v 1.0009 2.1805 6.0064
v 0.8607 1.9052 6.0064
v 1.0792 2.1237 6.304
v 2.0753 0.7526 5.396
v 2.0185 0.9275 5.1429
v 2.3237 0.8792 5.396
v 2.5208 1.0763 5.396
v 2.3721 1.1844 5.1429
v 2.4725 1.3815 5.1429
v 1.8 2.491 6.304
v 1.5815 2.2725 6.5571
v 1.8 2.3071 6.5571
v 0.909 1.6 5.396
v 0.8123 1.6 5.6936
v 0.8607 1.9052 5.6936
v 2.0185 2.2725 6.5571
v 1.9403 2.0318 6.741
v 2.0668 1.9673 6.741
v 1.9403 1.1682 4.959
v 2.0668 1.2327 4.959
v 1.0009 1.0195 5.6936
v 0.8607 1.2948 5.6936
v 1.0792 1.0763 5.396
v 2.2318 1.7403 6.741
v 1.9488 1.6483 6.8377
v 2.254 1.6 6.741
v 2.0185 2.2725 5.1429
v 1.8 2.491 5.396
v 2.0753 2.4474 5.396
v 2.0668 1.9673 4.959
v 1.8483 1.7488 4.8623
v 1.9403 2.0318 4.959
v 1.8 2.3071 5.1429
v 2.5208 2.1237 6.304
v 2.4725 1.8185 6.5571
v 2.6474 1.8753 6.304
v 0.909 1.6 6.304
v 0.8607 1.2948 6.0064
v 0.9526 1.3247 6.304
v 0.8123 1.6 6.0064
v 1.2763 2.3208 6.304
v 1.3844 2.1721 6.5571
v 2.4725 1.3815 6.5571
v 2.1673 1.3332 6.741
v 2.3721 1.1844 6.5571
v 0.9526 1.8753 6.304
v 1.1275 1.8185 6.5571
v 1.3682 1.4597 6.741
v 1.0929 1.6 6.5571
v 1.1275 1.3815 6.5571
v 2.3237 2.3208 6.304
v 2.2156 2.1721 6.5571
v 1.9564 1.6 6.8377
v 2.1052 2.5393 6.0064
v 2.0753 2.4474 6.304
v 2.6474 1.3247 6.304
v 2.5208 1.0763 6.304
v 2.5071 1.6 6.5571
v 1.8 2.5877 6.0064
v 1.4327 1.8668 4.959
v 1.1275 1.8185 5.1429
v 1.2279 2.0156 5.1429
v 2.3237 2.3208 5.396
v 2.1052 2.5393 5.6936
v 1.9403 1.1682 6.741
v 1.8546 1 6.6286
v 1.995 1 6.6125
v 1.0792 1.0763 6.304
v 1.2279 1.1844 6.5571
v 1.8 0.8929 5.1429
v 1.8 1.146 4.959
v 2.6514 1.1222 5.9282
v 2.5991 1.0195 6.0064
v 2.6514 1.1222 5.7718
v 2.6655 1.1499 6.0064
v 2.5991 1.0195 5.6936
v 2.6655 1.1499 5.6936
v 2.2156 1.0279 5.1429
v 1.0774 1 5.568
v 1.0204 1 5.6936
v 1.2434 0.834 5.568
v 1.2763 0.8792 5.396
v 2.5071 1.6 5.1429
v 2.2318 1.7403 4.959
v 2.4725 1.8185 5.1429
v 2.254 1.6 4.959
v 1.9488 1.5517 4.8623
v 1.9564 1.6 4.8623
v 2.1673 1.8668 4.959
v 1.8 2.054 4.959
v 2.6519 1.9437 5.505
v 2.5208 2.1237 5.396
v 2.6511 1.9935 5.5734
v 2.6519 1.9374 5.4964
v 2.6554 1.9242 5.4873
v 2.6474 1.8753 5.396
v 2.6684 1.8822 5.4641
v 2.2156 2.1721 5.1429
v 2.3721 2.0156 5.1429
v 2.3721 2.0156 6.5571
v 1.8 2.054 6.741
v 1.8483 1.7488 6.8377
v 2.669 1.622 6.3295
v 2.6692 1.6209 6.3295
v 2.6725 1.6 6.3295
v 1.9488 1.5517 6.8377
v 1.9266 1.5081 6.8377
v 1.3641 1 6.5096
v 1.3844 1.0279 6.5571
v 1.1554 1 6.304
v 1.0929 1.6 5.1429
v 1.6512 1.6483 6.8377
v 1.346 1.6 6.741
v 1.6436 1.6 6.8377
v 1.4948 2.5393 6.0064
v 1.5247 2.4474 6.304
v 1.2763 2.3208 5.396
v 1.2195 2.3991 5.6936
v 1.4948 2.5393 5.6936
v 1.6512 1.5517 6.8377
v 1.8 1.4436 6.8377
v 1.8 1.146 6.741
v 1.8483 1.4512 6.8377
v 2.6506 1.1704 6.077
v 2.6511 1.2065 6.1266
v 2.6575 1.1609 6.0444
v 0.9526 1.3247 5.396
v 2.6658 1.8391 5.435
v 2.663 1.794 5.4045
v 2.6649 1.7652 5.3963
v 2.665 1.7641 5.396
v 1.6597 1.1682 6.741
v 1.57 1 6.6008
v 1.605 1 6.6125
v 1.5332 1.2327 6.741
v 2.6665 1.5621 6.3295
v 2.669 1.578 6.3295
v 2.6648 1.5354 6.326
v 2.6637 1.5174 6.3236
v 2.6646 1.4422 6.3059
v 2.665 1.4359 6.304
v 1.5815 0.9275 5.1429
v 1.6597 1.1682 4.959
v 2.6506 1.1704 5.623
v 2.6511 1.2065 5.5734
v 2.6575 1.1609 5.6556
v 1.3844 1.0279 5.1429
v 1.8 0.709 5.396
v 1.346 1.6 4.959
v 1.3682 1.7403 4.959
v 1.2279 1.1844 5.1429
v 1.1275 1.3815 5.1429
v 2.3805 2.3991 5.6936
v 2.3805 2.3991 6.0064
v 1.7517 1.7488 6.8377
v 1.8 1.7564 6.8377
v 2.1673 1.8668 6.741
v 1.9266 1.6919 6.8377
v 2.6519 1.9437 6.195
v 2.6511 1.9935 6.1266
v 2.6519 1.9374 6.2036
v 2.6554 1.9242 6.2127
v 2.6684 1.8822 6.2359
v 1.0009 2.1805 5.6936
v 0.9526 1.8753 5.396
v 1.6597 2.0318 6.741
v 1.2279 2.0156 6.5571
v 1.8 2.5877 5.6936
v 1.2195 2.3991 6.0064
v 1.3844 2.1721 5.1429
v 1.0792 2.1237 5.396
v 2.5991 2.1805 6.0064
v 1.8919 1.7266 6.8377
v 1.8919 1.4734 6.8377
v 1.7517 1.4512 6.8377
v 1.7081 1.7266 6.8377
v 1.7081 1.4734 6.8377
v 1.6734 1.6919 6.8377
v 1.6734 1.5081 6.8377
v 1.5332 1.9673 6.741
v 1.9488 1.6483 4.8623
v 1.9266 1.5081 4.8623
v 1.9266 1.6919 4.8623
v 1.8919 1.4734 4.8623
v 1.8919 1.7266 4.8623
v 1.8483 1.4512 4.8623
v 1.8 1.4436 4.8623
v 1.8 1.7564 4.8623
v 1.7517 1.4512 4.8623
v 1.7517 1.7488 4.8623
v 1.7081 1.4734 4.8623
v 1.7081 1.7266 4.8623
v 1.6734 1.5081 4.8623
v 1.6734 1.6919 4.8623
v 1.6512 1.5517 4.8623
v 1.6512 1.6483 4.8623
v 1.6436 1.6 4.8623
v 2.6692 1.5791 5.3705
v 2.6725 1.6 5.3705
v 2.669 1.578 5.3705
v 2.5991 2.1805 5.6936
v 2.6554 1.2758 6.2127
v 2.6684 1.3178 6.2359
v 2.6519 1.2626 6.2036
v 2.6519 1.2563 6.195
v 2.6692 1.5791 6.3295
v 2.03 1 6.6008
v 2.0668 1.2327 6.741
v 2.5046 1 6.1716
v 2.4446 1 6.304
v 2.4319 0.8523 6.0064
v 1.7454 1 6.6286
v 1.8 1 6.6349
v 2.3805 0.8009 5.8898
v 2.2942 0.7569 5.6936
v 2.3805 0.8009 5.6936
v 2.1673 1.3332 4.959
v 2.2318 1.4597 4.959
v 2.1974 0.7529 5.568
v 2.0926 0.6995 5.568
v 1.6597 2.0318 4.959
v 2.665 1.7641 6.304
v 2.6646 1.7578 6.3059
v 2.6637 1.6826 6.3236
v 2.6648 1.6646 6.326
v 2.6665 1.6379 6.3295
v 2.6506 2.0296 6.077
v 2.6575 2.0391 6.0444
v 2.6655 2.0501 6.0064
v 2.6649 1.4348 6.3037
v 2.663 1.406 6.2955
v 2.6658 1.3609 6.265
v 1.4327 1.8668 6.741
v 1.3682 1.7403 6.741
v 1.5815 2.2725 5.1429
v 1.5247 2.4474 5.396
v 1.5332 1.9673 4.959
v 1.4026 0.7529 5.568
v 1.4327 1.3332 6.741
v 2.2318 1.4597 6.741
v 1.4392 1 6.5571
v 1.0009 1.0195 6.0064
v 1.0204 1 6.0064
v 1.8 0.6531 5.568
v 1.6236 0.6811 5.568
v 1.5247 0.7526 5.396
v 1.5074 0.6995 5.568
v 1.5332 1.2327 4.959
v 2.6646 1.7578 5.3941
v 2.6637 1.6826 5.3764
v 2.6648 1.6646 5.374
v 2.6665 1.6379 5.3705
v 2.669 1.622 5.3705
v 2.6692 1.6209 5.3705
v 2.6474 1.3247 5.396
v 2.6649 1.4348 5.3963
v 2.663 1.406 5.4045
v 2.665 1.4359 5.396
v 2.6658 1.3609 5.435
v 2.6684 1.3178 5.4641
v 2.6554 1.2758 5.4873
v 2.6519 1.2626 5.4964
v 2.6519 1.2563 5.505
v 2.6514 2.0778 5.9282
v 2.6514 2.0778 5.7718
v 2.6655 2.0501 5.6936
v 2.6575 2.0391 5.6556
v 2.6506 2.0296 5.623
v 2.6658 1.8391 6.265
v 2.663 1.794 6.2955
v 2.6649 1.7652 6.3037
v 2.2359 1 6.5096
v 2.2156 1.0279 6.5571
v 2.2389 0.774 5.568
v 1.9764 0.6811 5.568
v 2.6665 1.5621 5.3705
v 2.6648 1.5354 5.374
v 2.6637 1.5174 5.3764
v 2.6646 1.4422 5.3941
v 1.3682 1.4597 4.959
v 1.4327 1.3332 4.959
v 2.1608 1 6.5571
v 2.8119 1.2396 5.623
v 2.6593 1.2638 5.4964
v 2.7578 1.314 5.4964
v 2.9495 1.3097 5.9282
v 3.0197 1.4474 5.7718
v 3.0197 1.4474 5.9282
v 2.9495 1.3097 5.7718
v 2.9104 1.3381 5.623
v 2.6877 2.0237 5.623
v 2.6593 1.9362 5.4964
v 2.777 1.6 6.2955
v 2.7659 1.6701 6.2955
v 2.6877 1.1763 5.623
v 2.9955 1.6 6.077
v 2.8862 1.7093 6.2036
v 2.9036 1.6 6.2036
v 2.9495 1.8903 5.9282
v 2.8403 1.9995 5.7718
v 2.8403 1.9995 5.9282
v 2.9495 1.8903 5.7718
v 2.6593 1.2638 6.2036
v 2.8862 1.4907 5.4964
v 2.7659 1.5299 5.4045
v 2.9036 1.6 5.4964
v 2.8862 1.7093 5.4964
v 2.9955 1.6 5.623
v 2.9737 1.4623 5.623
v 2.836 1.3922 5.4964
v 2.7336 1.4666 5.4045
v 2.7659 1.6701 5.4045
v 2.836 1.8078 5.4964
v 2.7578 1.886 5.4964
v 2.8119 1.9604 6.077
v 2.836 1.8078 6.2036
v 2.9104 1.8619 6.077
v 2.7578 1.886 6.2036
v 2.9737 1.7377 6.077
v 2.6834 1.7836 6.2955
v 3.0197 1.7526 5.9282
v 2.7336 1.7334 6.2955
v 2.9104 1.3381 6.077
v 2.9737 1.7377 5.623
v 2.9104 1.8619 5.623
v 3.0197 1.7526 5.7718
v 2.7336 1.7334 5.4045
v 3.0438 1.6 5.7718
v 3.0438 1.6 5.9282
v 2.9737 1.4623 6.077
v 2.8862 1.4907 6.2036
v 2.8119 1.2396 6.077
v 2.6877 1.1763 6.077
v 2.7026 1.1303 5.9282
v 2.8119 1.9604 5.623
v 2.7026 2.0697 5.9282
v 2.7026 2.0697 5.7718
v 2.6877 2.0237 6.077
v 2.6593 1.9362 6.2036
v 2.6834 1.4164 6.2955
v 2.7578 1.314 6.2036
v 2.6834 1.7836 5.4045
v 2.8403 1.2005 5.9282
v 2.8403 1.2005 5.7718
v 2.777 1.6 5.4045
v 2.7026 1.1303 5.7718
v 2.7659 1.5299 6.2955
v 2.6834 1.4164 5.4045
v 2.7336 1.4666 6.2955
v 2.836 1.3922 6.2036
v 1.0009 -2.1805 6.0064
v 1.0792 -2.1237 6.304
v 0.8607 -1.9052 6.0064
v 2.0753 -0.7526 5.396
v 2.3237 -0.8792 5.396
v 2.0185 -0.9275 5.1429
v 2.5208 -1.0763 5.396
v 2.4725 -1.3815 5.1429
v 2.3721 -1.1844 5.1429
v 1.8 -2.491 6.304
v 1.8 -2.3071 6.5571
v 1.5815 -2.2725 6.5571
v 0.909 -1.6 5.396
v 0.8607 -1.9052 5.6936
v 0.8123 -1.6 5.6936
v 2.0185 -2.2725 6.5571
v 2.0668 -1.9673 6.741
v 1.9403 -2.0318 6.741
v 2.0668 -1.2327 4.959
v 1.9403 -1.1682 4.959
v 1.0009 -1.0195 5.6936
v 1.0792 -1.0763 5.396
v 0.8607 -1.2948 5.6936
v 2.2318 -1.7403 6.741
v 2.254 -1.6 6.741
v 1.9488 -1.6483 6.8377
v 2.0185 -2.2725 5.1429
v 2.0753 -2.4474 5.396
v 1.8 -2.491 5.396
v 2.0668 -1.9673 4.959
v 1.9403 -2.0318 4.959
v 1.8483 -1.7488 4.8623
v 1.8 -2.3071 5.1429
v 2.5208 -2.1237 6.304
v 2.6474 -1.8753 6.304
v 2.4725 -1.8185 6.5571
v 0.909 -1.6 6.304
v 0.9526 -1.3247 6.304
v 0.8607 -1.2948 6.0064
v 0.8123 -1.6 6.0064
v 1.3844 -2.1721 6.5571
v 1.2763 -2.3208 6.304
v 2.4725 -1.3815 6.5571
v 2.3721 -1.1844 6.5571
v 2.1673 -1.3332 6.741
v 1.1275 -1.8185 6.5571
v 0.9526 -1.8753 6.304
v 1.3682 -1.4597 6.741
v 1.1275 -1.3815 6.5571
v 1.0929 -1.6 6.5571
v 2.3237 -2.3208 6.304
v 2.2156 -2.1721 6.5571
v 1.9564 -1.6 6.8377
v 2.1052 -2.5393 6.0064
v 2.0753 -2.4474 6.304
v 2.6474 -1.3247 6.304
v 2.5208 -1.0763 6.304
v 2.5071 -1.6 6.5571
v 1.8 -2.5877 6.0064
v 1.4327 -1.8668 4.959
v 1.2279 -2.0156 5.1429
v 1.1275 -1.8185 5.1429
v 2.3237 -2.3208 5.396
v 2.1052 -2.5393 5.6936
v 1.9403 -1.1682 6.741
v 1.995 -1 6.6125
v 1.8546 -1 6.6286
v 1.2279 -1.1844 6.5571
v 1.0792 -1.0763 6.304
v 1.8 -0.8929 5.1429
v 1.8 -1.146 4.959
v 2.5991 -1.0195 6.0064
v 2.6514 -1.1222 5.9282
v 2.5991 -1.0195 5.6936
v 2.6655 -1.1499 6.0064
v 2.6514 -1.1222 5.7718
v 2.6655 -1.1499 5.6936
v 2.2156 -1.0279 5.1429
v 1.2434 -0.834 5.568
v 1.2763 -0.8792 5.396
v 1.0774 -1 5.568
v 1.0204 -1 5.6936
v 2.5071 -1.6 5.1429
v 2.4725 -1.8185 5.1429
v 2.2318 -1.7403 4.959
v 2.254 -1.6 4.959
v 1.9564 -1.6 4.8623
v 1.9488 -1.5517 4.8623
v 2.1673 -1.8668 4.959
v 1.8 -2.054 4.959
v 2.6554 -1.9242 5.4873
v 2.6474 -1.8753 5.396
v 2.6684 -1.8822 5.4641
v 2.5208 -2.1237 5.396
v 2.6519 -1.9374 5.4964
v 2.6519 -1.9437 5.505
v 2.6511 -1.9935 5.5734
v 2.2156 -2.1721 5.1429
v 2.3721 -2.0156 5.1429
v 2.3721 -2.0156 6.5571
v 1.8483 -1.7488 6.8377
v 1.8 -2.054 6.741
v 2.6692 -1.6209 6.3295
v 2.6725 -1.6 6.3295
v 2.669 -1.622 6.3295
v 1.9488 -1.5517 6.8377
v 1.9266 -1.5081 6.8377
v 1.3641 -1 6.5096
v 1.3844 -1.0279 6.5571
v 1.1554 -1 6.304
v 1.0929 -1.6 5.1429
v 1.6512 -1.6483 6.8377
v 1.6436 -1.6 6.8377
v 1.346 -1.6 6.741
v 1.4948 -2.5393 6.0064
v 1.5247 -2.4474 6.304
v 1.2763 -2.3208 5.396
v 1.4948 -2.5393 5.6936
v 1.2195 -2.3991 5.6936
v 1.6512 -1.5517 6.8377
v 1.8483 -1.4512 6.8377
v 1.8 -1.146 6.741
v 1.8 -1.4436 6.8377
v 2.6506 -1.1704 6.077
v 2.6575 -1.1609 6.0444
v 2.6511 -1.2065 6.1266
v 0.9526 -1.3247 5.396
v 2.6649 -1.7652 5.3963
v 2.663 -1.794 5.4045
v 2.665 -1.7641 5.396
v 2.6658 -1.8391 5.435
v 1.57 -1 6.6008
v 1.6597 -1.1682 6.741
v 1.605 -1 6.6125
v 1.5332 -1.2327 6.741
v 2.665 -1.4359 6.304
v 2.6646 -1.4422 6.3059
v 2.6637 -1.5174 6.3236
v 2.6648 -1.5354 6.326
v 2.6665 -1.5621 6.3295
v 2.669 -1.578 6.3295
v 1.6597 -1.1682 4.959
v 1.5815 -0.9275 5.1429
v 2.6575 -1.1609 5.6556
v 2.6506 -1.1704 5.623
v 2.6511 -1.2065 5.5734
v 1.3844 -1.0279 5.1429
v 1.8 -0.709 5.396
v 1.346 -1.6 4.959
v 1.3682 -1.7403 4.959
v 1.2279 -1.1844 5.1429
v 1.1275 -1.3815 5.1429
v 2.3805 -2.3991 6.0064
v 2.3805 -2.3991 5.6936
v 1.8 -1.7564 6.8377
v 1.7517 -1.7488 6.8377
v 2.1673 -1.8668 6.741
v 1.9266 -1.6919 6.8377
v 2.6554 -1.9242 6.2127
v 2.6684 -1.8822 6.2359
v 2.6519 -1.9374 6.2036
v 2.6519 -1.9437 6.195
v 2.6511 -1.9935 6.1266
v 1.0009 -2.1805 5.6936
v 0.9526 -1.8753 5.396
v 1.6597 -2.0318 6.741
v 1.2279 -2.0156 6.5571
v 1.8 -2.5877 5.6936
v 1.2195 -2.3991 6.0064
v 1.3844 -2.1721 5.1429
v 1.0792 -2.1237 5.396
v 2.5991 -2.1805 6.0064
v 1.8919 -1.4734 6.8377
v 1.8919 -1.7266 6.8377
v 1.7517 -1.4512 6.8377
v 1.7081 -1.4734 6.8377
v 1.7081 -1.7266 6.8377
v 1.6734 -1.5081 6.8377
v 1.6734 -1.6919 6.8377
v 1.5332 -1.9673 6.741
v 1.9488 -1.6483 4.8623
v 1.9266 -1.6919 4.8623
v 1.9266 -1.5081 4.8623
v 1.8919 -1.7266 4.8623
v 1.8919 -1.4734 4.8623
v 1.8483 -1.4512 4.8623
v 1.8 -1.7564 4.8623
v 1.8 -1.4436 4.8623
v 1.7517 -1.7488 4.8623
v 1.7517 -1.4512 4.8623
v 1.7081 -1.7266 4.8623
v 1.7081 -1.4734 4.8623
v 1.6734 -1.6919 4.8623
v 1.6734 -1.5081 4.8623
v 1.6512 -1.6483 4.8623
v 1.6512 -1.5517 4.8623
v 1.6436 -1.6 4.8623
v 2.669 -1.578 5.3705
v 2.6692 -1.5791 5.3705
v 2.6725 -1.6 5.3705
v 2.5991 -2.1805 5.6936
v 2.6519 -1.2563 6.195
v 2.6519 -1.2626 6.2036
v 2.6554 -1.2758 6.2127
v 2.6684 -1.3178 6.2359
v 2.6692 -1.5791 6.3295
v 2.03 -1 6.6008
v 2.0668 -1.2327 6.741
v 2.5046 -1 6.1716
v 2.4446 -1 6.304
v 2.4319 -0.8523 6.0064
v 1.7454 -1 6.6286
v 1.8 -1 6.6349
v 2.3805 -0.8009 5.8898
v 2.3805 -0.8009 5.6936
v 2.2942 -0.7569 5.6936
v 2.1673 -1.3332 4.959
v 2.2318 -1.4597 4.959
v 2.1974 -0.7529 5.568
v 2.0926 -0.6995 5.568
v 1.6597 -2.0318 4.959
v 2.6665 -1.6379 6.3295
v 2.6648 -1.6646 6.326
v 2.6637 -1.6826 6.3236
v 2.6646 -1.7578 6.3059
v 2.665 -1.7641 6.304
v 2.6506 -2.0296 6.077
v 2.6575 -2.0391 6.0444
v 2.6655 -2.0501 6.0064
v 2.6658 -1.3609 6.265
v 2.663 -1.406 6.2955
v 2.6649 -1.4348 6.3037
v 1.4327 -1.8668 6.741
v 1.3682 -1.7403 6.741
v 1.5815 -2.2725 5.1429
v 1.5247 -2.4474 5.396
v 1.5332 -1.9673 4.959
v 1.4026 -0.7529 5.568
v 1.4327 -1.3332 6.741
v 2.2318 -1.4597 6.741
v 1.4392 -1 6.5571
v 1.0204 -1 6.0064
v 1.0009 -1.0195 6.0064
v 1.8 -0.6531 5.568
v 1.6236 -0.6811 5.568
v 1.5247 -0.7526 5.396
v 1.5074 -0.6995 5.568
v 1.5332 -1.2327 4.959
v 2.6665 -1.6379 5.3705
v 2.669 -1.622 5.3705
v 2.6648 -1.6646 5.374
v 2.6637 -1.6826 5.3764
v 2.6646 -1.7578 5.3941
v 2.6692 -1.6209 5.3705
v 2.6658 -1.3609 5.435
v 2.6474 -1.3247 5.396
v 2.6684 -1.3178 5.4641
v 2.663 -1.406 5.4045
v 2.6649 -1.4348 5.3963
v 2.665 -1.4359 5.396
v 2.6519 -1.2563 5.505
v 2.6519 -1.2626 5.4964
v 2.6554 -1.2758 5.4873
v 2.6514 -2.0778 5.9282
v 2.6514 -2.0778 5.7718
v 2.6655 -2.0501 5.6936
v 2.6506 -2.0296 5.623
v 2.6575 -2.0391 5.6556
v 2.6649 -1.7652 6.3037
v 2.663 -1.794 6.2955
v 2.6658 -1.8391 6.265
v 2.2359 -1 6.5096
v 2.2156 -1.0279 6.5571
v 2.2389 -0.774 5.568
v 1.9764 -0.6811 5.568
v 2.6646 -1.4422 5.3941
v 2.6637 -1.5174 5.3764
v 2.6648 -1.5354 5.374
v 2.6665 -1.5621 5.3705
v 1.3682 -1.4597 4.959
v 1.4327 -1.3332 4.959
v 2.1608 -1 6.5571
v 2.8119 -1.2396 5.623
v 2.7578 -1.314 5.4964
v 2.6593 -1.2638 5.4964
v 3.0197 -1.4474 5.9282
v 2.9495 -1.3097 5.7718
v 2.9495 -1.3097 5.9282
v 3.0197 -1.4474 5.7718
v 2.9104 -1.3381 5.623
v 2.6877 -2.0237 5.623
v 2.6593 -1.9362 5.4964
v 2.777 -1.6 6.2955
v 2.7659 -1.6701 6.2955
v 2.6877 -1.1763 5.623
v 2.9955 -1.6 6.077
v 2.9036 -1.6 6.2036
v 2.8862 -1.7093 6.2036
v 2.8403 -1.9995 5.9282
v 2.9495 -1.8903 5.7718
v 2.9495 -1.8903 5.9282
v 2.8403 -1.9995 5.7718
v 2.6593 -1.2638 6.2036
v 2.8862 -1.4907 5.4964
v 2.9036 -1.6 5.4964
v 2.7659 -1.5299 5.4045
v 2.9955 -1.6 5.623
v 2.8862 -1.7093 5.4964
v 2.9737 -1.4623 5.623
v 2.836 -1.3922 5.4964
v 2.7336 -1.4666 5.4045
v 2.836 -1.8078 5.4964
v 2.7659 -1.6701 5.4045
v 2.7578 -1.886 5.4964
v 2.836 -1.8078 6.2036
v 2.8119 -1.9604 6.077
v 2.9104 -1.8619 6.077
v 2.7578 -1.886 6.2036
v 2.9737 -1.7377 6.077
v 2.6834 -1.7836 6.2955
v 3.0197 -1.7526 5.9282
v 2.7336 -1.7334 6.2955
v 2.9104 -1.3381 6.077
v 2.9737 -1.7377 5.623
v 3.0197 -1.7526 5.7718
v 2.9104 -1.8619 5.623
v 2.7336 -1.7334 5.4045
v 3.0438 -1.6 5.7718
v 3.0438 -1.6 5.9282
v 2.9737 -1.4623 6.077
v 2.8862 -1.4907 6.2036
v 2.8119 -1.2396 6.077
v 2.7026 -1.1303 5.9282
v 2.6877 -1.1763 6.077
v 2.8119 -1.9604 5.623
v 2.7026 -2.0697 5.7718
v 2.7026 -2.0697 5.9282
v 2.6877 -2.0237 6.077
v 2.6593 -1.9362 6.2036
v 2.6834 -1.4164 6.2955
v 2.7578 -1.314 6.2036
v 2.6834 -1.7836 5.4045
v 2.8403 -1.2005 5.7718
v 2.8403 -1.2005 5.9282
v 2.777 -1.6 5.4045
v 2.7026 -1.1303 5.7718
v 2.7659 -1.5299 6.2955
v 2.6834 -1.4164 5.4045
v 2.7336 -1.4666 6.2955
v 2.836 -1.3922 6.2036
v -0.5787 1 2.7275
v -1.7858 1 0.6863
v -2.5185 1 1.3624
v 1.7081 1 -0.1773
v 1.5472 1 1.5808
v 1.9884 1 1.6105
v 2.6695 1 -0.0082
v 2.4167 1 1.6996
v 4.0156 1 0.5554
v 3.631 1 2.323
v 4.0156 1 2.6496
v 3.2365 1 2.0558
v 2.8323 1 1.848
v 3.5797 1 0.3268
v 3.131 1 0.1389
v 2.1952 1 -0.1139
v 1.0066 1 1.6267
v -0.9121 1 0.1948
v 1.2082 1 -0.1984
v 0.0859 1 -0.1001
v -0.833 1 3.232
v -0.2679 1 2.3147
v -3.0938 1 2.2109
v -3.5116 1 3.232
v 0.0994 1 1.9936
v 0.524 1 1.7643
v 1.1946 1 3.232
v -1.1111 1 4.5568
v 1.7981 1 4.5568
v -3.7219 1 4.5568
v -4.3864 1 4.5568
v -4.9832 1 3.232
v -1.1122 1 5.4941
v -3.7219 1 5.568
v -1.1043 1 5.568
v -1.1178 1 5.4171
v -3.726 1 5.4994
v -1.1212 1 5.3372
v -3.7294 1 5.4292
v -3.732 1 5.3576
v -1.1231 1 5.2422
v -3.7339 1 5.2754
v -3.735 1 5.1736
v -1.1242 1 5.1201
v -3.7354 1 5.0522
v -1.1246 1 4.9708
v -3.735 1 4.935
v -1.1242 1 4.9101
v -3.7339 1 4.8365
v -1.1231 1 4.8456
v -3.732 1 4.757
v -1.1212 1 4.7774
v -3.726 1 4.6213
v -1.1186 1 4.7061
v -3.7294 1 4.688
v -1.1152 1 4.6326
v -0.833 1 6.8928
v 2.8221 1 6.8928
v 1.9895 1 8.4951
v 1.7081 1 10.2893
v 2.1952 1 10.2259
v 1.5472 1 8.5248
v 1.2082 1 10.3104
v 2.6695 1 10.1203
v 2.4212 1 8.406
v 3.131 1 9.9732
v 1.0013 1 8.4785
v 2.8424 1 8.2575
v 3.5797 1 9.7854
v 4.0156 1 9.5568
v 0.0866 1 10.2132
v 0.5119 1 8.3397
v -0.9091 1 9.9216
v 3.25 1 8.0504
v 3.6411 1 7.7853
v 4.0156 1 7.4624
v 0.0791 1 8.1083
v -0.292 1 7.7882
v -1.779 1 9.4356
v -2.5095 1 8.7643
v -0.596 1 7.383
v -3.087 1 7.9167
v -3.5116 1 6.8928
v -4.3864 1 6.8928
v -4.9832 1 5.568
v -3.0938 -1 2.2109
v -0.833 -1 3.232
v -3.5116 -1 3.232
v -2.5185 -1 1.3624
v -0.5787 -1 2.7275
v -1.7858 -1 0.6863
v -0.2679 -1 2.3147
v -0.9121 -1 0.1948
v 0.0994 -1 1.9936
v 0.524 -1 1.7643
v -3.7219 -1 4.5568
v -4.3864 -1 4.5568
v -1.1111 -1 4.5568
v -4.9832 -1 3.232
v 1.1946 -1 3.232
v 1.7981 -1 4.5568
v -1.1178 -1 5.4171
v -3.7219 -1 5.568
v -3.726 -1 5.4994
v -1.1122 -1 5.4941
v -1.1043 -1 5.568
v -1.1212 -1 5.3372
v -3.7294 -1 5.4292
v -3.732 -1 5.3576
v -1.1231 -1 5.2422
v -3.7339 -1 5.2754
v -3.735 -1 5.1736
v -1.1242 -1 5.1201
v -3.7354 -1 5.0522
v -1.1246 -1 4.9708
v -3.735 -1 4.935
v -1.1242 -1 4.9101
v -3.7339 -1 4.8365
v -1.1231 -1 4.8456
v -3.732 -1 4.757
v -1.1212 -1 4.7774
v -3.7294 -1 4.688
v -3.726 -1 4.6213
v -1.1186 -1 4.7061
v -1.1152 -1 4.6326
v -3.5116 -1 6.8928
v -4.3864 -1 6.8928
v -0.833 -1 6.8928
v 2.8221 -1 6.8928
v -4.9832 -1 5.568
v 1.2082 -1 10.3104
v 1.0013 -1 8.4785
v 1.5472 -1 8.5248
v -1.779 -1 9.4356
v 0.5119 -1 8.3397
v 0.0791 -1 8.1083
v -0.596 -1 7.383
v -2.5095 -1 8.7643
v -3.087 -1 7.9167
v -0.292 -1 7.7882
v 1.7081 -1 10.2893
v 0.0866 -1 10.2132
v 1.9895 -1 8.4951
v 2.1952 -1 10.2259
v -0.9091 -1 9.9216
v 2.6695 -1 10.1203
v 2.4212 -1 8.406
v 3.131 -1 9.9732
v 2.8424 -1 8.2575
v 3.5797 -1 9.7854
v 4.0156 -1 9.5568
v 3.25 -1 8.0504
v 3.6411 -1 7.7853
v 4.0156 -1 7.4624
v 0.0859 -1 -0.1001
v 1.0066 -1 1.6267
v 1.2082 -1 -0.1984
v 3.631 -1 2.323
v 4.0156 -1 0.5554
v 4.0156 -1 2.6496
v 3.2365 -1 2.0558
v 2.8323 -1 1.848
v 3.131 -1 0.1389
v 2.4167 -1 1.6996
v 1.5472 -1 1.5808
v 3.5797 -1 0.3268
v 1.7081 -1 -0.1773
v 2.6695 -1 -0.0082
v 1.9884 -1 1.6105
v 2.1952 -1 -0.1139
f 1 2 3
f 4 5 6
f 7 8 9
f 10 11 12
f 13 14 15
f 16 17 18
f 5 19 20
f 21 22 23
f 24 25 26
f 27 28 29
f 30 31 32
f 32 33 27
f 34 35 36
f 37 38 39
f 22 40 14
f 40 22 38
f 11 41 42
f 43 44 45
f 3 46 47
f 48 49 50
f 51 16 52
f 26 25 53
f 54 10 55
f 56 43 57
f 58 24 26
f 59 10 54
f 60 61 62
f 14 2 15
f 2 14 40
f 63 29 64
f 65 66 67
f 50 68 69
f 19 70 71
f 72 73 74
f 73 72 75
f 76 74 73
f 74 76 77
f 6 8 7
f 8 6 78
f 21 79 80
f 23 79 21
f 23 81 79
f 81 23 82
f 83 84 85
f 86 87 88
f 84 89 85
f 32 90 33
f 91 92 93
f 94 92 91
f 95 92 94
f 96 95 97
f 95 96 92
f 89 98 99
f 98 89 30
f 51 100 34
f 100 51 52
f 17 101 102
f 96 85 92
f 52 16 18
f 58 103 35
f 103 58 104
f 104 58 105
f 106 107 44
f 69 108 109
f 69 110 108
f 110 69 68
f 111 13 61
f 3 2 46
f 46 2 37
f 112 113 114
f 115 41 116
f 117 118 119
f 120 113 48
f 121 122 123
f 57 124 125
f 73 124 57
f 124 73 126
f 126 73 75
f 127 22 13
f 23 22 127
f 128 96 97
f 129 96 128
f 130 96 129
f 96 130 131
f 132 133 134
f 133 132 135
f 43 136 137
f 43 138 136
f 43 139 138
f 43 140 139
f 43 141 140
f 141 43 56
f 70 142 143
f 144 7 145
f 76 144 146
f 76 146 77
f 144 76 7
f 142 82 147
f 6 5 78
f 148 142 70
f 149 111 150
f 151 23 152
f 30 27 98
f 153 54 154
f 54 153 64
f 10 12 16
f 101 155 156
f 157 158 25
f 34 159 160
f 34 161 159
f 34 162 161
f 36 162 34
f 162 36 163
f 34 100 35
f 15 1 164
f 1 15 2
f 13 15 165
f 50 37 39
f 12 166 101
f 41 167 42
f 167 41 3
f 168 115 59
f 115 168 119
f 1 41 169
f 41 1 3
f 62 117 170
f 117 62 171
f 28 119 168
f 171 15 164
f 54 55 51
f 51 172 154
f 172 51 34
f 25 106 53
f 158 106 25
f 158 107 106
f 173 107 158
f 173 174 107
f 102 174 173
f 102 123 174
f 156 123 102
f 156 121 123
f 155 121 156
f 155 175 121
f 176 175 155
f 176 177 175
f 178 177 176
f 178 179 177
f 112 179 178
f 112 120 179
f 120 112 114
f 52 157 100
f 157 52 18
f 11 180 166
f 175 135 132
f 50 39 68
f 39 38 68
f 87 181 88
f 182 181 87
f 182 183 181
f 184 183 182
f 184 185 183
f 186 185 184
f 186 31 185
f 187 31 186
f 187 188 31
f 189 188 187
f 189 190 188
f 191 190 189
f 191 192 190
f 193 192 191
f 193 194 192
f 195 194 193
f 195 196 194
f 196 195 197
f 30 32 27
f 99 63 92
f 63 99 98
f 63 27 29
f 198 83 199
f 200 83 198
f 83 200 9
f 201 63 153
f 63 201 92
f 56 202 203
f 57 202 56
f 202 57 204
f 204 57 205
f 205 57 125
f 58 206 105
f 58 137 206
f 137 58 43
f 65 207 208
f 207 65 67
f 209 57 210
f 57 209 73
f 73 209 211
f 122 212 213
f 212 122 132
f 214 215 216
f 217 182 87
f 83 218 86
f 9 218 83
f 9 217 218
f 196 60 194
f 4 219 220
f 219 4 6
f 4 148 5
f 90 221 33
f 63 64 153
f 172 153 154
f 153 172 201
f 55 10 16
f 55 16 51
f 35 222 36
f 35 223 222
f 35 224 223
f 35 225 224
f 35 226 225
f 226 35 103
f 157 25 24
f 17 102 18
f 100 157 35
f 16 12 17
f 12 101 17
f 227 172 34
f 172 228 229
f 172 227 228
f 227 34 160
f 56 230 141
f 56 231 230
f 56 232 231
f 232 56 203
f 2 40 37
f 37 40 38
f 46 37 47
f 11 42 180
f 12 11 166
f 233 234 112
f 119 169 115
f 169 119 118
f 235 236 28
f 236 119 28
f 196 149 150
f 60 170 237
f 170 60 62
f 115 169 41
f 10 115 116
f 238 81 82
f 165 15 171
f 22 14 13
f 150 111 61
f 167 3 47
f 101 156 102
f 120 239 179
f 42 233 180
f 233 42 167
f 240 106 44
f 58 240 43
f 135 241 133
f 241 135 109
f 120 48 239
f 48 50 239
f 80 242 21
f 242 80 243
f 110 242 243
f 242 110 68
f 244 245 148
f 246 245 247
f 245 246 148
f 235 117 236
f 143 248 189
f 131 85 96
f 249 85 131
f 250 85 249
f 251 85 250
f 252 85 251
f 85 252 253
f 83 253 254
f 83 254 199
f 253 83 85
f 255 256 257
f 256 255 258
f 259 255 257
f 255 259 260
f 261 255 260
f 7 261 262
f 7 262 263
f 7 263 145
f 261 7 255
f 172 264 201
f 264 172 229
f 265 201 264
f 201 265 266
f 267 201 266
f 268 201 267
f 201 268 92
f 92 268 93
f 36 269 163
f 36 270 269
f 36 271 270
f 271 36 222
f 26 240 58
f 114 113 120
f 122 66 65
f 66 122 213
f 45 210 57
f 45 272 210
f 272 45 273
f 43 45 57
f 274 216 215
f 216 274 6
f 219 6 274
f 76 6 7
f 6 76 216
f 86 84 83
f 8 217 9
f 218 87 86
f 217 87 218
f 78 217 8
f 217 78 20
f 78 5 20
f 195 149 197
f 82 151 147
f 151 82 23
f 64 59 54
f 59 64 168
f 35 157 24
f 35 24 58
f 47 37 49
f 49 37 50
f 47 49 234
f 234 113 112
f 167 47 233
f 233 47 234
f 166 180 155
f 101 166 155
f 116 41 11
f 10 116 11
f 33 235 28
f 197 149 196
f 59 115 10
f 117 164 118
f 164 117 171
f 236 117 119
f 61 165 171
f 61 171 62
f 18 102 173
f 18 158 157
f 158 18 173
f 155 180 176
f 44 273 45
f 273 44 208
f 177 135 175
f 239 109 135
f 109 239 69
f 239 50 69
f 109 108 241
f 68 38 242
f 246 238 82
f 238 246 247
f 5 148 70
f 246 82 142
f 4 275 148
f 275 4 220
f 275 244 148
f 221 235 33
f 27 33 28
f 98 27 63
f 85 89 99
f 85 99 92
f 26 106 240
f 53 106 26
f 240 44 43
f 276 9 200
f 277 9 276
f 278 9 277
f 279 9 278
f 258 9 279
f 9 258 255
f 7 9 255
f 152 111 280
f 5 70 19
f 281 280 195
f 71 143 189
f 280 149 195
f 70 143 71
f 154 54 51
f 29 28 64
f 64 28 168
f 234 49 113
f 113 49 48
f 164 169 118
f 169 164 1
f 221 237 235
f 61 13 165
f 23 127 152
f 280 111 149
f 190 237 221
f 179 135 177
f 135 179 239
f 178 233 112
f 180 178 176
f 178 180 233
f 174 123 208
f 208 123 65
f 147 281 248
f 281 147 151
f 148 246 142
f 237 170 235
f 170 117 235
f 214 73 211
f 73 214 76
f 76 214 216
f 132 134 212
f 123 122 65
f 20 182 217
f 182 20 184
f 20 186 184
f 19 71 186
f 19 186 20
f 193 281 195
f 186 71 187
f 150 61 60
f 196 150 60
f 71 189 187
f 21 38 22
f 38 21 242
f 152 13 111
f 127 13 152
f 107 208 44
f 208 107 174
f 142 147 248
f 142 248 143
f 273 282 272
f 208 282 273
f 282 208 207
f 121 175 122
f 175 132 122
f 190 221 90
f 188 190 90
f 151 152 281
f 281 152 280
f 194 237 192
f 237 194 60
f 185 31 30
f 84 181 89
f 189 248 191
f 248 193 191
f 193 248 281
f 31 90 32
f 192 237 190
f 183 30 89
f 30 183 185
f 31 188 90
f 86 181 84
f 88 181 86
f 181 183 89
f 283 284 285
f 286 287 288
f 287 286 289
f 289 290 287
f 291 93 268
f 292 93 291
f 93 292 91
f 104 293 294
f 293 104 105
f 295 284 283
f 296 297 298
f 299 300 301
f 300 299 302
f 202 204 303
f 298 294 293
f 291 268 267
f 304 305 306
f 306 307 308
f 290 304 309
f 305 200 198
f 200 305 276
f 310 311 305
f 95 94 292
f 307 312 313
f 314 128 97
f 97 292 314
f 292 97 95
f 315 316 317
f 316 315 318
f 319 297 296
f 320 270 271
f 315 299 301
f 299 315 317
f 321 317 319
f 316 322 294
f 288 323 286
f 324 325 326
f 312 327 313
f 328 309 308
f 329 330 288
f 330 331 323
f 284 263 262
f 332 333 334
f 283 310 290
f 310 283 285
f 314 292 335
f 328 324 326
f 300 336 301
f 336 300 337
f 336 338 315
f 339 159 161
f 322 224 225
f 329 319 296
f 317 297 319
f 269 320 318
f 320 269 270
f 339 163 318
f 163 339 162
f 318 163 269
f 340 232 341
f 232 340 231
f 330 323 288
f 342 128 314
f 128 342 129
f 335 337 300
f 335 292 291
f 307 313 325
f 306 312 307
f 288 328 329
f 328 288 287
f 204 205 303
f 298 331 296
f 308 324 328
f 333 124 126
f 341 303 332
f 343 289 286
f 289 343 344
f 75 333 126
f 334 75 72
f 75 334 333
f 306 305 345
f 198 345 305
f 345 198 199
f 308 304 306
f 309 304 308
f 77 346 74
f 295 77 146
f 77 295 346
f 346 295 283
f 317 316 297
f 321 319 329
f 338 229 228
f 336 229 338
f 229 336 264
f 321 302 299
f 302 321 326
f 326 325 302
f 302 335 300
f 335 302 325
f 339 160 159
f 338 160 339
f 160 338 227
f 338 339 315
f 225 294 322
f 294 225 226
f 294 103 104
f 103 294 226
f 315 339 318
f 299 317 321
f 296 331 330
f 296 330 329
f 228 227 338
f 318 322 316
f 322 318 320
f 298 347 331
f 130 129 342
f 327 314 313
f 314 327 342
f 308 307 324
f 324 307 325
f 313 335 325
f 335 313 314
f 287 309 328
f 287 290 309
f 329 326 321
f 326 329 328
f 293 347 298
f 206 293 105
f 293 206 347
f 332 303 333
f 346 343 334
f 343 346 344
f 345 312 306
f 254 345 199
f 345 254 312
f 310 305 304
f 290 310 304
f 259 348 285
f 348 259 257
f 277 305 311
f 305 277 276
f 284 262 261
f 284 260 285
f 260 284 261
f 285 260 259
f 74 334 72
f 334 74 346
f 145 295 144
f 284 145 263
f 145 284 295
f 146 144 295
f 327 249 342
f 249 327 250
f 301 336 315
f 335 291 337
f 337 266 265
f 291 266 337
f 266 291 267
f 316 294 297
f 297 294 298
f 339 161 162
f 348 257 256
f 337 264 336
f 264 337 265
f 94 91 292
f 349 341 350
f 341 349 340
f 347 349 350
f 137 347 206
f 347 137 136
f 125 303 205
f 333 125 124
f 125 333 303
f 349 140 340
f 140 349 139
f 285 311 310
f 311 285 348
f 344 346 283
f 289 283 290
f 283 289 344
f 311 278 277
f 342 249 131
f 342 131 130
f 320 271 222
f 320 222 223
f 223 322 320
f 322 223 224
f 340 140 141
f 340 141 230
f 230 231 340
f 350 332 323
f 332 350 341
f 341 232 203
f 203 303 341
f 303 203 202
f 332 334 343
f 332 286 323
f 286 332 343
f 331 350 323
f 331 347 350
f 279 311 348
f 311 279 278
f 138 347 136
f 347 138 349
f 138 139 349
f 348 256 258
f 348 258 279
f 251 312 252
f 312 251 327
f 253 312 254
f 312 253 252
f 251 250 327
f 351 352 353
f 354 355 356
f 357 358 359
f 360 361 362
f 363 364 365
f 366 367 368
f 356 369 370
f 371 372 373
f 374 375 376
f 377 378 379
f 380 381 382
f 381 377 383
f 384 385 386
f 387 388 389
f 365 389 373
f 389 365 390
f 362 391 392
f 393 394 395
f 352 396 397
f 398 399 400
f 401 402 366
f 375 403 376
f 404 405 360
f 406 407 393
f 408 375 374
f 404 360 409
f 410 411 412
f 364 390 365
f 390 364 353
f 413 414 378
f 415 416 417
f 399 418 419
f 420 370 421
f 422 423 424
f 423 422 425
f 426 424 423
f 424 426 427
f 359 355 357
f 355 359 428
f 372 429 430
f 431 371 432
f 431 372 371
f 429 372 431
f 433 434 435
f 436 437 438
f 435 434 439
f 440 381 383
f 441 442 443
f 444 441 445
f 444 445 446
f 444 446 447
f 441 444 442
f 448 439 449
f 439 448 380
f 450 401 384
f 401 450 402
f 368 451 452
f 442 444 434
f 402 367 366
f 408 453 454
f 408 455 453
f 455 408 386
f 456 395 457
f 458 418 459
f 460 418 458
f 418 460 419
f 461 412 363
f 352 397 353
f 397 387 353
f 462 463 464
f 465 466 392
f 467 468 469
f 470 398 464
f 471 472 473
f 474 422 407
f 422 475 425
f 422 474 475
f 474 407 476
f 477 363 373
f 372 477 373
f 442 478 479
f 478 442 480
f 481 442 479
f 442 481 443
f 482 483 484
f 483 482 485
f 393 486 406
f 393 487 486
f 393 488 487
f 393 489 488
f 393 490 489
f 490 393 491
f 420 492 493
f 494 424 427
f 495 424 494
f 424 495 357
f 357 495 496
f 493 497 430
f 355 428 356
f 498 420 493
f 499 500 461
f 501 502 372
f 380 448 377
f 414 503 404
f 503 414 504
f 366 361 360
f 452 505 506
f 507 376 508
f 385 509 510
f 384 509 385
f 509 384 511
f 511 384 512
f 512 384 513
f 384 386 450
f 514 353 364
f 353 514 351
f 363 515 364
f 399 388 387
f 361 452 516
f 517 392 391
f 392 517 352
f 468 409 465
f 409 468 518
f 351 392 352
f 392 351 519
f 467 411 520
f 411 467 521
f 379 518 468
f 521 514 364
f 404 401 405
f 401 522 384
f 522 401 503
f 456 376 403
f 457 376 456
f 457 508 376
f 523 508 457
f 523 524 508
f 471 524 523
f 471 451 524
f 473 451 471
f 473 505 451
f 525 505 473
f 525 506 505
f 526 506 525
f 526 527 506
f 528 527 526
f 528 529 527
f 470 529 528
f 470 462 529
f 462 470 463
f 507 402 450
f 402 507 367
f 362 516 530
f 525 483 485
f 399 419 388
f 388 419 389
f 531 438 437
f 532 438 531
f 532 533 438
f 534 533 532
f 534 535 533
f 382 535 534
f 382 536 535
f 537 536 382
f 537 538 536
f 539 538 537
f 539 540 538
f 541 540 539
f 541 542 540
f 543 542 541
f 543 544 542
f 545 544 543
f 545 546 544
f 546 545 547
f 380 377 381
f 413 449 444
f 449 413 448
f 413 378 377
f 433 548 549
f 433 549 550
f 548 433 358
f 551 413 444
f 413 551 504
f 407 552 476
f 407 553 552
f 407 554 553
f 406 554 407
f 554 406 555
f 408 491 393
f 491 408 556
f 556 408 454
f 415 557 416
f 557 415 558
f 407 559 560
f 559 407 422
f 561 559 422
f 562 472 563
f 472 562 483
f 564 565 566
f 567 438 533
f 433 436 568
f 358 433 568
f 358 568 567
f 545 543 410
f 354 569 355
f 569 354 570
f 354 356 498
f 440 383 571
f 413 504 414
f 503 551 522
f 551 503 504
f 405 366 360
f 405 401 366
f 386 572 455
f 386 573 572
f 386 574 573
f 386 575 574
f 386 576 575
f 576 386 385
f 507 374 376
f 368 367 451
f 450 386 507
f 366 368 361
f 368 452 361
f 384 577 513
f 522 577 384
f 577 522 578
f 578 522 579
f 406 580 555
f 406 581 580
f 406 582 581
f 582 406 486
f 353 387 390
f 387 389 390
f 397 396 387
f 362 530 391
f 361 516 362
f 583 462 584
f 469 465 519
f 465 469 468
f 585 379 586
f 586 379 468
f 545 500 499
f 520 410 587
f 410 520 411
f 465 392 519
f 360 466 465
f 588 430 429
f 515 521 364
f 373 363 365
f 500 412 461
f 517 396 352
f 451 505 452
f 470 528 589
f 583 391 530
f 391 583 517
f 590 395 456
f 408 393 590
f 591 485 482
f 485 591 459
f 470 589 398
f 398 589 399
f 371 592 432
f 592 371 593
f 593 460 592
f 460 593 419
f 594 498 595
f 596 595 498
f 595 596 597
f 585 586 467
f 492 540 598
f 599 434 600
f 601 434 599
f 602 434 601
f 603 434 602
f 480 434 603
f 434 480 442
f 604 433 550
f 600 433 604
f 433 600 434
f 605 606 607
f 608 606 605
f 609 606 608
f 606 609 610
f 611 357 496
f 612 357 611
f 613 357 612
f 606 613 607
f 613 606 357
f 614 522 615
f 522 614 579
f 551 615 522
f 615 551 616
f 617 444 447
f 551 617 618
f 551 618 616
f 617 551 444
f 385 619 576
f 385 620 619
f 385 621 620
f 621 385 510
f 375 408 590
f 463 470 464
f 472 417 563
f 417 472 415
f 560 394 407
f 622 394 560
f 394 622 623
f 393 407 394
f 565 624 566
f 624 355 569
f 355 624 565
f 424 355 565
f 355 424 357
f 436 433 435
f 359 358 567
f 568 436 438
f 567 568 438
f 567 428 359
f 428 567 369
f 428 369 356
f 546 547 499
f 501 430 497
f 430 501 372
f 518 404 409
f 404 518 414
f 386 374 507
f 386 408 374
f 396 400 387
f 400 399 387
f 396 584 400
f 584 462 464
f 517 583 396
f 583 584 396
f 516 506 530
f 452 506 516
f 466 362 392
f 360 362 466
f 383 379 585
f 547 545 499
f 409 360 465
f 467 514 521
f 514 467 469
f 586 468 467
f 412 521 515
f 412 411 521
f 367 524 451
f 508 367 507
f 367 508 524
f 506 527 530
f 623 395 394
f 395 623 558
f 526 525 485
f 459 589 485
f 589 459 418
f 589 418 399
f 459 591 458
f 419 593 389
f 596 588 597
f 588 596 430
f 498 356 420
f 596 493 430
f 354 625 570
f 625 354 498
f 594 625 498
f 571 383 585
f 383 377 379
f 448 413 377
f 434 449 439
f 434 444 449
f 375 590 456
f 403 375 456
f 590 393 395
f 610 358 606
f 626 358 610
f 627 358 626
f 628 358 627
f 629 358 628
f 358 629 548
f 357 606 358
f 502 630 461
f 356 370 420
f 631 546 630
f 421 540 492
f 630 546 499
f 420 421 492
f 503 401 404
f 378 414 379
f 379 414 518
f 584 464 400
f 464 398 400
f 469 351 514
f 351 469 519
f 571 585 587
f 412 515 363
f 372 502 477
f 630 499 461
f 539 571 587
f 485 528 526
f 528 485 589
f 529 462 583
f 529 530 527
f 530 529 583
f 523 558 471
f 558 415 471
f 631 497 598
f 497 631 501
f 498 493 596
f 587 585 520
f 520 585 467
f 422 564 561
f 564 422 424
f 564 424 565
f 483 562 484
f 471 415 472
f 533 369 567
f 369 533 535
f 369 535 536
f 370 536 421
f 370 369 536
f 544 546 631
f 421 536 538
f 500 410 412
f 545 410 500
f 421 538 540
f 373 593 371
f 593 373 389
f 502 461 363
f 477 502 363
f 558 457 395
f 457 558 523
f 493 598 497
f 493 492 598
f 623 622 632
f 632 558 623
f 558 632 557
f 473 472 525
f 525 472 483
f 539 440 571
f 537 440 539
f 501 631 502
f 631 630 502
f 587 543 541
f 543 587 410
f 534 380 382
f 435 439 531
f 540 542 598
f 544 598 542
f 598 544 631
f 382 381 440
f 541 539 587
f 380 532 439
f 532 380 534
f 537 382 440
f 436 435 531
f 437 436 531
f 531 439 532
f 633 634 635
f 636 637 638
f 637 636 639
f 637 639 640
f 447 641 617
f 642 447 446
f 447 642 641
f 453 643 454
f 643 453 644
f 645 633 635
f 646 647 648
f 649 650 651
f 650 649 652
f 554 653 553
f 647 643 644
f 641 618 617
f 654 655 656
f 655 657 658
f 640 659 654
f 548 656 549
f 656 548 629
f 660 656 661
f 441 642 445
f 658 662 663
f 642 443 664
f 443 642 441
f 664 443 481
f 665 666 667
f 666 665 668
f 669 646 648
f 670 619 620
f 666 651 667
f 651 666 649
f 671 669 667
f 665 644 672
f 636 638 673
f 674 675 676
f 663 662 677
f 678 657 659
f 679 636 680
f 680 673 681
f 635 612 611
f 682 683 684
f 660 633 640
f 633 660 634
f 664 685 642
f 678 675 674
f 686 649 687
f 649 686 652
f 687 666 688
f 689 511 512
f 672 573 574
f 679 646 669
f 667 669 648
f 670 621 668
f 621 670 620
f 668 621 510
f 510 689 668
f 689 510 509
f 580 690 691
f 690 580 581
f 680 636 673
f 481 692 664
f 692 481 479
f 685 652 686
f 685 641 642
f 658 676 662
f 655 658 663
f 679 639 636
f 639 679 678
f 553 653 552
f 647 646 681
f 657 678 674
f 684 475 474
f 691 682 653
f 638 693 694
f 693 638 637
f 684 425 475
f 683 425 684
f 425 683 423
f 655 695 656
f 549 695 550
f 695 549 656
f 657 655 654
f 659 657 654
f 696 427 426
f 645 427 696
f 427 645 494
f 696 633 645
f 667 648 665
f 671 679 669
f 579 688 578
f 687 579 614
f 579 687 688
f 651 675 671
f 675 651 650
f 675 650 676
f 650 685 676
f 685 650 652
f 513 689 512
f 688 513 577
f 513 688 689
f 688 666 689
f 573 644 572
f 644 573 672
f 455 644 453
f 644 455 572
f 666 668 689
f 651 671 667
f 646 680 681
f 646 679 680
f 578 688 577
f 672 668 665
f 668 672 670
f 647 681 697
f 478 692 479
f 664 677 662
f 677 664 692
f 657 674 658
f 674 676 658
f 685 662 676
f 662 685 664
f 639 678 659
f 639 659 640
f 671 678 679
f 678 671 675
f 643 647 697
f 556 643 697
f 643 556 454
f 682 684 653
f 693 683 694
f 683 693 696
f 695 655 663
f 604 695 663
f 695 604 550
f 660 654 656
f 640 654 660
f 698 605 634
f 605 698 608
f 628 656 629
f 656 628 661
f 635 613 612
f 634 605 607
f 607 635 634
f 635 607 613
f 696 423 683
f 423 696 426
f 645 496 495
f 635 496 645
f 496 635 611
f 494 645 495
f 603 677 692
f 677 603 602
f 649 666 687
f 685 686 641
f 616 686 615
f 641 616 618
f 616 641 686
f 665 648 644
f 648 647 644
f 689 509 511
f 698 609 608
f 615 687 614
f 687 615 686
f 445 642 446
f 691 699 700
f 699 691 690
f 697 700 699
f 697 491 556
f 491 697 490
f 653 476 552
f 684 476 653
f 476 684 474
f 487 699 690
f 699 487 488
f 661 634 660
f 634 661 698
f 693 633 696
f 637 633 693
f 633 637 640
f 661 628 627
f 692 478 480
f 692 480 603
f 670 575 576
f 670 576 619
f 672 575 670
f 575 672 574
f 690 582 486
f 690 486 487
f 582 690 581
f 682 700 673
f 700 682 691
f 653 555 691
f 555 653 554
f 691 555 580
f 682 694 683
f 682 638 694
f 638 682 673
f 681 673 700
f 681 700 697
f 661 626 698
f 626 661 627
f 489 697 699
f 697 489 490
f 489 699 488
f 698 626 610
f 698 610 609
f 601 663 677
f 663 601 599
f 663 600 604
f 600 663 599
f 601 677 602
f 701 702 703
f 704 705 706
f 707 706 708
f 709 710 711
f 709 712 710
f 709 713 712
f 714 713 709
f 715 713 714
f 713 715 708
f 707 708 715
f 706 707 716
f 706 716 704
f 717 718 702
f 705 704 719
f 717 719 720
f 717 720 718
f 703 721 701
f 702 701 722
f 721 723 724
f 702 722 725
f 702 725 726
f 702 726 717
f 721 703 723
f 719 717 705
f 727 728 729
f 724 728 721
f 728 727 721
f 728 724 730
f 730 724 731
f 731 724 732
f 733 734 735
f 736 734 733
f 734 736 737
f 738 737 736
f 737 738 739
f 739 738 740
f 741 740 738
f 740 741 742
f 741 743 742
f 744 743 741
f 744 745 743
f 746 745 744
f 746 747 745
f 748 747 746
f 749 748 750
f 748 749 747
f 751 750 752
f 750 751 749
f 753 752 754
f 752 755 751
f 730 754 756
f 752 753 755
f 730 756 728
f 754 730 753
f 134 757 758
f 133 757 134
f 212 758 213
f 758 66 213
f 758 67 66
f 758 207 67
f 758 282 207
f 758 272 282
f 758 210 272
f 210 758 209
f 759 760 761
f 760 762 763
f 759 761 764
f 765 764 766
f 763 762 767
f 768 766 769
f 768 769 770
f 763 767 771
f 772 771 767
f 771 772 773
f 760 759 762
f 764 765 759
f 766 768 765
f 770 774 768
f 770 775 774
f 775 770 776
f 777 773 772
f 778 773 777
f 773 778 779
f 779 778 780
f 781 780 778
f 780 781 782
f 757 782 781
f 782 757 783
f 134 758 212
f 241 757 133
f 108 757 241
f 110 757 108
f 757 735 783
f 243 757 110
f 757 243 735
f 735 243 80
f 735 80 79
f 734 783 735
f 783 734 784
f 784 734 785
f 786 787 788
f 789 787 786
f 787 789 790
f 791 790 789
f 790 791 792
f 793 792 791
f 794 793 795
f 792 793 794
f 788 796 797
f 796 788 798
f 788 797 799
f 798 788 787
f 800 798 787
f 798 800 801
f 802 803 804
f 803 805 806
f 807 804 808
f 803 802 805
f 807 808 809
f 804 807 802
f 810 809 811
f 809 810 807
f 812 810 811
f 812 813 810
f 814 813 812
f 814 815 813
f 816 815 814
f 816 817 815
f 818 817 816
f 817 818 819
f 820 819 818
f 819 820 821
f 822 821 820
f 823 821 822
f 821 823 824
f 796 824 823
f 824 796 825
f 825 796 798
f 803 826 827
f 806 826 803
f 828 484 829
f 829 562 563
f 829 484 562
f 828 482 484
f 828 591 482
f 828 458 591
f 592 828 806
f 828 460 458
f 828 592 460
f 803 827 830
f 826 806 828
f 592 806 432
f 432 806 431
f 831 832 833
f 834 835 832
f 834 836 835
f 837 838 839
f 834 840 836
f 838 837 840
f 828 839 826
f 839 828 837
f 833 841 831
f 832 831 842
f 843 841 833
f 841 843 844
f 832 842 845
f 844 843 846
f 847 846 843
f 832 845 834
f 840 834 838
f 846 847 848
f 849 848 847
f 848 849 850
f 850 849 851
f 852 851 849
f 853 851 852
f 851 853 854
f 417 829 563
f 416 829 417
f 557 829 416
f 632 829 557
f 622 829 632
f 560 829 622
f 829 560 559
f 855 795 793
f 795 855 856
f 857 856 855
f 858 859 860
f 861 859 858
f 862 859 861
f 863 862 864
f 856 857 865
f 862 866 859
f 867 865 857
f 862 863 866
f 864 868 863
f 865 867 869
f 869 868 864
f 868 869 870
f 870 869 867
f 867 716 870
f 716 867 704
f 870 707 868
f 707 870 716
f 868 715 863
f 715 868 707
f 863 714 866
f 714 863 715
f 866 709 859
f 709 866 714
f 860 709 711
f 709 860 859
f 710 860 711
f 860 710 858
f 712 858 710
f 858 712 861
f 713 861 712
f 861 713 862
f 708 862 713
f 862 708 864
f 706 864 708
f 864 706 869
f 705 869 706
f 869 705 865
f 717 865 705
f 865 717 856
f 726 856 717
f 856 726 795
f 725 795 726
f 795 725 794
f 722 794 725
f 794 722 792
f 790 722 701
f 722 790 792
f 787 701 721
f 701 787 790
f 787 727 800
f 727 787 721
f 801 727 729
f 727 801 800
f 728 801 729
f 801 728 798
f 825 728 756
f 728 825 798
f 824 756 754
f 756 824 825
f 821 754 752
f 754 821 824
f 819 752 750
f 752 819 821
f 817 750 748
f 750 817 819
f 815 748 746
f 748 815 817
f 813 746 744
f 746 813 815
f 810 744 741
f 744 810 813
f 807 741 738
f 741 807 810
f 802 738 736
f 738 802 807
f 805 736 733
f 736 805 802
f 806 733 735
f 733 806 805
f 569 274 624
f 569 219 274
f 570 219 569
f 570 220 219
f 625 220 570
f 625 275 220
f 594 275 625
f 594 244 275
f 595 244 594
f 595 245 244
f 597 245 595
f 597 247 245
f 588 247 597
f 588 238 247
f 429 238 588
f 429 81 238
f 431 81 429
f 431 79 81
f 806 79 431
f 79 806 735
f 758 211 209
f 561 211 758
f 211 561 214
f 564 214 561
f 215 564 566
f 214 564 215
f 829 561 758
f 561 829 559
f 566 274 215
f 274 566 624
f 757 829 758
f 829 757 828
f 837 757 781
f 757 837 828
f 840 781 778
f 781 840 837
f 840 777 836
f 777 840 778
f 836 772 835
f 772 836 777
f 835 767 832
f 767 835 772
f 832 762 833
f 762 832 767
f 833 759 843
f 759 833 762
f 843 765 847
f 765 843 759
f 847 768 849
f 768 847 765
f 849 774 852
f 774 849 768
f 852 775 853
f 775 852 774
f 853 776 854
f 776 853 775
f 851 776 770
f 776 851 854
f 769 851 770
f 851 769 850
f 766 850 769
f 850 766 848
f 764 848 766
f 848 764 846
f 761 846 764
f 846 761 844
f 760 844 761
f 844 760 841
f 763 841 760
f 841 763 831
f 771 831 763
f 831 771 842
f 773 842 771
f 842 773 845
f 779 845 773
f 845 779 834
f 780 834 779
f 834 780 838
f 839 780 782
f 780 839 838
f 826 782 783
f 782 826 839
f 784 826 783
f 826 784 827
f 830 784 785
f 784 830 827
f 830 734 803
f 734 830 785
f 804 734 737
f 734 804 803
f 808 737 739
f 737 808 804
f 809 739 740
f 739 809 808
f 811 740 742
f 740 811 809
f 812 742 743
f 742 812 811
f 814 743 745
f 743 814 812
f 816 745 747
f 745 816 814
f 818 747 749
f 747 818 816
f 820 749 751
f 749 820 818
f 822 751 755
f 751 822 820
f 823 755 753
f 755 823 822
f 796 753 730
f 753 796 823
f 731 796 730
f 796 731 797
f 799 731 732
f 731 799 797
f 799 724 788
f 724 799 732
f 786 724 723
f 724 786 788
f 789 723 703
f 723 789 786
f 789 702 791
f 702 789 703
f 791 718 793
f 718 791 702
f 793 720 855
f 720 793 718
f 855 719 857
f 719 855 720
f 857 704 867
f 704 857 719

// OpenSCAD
$fn = 20;

font="Book Antiqua:style=Bold";
font_size = 9;
t = 2;

eye_r = 1;
eye_pupil_r = 0.5;


module character(char) {
    rotate([90,0,0])
        translate([0,0,-t]/2)
            linear_extrude(height=t)
                text(char, font=font, halign="center");
    pair_of_eyes();
}

module pair_of_eyes() {
    module eye() {
        color("white")
            sphere(r=eye_r);
        translate([eye_r-eye_pupil_r/2,0,0])
            color("black")
                sphere(r=eye_pupil_r);
    }
    
    module eye_position() {
        translate([0.2*font_size, 0.8*t, font_size*0.65])
            children();
    }
    
    mirror(v=[0,1,0])
        eye_position()
            eye();
    eye_position()
        eye();
}

char = "€";
character(char);
